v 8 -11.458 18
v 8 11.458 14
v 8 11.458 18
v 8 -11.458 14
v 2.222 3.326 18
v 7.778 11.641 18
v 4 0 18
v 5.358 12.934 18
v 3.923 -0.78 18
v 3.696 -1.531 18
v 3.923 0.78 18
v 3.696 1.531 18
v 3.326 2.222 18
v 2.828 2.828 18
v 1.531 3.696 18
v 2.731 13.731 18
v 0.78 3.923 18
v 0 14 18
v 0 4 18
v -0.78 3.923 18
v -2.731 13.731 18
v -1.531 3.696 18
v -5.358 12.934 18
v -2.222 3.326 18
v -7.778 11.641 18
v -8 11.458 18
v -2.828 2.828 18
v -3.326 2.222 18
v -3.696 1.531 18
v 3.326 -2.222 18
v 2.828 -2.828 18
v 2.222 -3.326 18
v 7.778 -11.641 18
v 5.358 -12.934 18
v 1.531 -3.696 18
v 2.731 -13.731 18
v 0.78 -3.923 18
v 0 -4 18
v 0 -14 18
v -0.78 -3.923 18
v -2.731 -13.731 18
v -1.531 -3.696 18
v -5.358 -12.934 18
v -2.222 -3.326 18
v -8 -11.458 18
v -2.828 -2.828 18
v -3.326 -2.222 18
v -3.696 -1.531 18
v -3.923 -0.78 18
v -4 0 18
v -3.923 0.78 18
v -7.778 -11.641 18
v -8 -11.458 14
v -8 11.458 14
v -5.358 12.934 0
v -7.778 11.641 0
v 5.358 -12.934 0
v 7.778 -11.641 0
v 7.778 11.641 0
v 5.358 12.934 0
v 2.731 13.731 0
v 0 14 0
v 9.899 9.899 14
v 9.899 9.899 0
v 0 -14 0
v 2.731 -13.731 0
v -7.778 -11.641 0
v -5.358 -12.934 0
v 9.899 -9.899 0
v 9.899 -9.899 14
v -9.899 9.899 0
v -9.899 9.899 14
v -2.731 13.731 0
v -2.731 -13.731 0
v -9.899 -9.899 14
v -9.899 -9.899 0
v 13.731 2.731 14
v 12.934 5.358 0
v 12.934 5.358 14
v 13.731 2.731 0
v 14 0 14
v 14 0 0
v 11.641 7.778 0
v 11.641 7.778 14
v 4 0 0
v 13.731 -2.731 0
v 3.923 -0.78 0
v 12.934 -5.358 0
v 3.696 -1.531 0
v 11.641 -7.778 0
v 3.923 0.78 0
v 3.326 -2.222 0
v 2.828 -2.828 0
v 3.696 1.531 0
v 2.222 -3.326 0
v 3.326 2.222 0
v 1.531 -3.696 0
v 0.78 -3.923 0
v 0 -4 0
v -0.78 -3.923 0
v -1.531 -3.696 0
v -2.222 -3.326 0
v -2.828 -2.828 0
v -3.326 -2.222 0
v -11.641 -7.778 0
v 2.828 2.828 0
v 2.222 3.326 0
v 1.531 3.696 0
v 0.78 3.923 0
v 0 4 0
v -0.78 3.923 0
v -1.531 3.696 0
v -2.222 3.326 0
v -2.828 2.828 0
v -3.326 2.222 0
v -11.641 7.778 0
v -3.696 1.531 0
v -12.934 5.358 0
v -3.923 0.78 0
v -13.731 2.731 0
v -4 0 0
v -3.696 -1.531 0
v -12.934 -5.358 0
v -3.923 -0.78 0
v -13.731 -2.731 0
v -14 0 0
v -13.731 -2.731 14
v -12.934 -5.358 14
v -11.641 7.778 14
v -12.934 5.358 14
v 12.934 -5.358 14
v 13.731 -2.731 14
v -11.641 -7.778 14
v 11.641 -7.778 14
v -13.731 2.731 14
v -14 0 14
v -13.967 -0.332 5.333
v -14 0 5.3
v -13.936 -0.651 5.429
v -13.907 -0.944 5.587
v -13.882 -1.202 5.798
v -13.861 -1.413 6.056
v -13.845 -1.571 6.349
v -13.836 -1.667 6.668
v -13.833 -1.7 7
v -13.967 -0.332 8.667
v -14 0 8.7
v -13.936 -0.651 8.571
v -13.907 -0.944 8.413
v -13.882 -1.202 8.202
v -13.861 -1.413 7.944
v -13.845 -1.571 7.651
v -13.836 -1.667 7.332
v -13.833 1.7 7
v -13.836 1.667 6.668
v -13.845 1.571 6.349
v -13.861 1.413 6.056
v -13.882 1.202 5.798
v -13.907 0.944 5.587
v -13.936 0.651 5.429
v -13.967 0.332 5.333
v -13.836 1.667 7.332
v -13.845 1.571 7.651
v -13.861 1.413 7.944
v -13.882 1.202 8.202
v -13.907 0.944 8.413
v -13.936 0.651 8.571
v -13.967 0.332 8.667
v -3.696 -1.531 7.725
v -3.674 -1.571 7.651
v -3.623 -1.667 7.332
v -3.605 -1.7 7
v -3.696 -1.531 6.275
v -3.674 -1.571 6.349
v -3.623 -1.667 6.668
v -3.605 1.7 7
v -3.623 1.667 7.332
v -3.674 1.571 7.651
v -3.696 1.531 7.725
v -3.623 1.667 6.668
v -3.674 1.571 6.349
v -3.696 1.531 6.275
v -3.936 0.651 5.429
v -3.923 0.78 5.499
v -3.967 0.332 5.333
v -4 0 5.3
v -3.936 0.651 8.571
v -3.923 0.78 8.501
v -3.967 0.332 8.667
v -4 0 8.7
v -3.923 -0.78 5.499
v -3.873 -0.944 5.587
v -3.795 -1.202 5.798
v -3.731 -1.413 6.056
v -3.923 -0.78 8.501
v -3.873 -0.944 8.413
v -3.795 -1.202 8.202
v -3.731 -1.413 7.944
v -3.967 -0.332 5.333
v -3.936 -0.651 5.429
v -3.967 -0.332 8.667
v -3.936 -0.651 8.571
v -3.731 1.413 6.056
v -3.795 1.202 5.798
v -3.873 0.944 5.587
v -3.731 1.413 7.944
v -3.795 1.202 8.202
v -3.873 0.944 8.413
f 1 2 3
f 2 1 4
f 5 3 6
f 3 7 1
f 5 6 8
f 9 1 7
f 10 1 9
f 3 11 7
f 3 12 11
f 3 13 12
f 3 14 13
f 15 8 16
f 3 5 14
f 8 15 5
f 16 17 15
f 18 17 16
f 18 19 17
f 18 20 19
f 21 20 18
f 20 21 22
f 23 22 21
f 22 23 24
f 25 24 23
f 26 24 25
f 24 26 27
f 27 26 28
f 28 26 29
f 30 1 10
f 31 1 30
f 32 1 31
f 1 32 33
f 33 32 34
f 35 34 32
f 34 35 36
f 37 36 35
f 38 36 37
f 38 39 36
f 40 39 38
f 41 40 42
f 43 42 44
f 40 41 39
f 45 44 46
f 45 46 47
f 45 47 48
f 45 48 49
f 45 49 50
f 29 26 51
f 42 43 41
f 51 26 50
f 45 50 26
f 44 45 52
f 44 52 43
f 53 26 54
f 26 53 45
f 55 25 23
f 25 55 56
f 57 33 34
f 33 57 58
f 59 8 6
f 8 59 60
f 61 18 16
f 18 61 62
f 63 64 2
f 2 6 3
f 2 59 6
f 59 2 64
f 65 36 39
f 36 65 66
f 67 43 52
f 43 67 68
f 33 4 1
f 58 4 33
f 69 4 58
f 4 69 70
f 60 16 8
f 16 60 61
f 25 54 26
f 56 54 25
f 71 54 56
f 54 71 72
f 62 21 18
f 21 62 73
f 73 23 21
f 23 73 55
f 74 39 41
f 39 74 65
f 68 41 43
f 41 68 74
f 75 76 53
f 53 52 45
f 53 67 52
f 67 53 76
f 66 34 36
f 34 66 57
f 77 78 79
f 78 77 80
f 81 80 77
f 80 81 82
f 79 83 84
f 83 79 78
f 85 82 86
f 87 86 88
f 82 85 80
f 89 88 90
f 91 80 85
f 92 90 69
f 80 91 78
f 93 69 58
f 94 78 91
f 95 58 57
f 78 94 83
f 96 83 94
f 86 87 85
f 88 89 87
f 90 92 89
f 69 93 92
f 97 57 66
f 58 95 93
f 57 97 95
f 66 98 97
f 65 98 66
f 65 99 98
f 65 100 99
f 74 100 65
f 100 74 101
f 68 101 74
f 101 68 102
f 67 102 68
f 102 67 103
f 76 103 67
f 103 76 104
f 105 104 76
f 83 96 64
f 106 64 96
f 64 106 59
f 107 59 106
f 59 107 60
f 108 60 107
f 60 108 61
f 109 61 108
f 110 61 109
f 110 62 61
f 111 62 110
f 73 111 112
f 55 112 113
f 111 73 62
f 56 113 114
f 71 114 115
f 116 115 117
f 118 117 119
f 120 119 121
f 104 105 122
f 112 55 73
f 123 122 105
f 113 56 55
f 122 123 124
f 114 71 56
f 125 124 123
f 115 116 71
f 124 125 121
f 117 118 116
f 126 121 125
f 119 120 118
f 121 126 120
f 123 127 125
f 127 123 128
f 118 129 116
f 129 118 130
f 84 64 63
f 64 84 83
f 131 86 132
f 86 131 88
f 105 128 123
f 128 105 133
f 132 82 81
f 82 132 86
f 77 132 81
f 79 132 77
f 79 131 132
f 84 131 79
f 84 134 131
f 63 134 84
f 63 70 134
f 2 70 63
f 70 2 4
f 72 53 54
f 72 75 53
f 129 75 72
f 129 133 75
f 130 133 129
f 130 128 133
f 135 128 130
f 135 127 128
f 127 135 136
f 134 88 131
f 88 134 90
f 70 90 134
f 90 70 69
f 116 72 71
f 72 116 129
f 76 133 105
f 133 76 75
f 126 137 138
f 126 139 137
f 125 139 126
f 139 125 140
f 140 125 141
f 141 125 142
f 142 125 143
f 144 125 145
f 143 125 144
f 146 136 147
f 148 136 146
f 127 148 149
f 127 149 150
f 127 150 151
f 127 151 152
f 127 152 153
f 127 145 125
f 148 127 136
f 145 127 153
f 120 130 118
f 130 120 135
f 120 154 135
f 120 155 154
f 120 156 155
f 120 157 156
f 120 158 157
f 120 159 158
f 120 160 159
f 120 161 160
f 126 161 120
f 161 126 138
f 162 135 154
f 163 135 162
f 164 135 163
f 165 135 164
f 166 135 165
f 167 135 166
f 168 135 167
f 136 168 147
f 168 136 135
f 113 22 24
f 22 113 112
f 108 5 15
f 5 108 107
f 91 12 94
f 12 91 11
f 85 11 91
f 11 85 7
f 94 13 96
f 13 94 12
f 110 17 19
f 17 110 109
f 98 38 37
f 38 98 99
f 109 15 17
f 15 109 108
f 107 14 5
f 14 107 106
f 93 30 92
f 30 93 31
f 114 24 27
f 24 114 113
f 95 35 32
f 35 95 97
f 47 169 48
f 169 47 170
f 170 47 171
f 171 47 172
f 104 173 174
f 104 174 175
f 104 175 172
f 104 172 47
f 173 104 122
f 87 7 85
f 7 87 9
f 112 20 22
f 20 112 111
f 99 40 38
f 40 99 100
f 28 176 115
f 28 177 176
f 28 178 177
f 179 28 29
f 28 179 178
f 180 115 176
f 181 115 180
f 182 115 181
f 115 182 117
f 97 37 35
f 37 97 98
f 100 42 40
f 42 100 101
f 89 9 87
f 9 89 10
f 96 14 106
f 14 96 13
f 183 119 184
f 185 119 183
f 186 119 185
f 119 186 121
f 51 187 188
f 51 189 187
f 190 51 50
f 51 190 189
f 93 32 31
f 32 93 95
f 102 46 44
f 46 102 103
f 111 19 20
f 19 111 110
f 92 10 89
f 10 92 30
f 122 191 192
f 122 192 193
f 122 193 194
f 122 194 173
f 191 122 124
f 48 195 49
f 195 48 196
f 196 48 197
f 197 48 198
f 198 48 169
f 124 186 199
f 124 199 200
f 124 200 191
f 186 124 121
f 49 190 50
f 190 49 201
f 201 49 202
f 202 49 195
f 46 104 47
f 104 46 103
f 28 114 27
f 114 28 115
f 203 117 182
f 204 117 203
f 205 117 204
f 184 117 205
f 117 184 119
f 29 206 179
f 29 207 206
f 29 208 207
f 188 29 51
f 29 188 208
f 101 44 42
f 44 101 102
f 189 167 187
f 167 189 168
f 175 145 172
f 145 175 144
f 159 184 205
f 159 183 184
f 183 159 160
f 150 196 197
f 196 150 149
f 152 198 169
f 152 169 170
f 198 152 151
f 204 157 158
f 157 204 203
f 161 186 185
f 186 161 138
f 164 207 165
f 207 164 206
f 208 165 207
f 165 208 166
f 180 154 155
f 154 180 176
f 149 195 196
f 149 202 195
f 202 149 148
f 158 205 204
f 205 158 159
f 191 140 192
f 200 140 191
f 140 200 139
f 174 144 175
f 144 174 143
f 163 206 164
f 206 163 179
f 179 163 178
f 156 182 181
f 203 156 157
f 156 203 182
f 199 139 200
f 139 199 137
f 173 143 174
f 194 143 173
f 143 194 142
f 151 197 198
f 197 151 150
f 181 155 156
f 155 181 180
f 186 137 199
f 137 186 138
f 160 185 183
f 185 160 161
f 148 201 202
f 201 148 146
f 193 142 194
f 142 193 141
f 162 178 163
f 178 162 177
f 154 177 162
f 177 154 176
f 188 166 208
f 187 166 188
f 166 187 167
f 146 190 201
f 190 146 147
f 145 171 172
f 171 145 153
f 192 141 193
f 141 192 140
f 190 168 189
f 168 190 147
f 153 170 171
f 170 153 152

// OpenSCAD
$fn = 32;

// ----------------------------------------------------------------------
// Oldham coupling hub: 28 x 18 mm
// ----------------------------------------------------------------------

// --- parameters (mm) ---
hub_d = 28;               // hub diameter
hub_l = 14;               // hub length
bore_d = 8;               // shaft bore
tongue_w = 16;            // drive tongue width
tongue_h = 4;             // drive tongue height
set_d = 3.4;              // set screw tap hole

module hub() {
  cylinder(h = hub_l, d = hub_d);
  /* tongue, clipped to the hub disc and sunk 1 mm into the face */
  intersection() {
    translate([-tongue_w / 2, -hub_d / 2, hub_l - 1])
      cube([tongue_w, hub_d, tongue_h + 1]);
    translate([0, 0, hub_l - 1]) cylinder(h = tongue_h + 1, d = hub_d);
  }
}

difference() {
  hub();
  translate([0, 0, -1]) cylinder(h = hub_l + tongue_h + 2, d = bore_d);
  translate([-hub_d / 2 - 1, 0, hub_l * 0.5])
    rotate([0, 90, 0]) cylinder(h = hub_d / 2 + 2, d = set_d);
}
